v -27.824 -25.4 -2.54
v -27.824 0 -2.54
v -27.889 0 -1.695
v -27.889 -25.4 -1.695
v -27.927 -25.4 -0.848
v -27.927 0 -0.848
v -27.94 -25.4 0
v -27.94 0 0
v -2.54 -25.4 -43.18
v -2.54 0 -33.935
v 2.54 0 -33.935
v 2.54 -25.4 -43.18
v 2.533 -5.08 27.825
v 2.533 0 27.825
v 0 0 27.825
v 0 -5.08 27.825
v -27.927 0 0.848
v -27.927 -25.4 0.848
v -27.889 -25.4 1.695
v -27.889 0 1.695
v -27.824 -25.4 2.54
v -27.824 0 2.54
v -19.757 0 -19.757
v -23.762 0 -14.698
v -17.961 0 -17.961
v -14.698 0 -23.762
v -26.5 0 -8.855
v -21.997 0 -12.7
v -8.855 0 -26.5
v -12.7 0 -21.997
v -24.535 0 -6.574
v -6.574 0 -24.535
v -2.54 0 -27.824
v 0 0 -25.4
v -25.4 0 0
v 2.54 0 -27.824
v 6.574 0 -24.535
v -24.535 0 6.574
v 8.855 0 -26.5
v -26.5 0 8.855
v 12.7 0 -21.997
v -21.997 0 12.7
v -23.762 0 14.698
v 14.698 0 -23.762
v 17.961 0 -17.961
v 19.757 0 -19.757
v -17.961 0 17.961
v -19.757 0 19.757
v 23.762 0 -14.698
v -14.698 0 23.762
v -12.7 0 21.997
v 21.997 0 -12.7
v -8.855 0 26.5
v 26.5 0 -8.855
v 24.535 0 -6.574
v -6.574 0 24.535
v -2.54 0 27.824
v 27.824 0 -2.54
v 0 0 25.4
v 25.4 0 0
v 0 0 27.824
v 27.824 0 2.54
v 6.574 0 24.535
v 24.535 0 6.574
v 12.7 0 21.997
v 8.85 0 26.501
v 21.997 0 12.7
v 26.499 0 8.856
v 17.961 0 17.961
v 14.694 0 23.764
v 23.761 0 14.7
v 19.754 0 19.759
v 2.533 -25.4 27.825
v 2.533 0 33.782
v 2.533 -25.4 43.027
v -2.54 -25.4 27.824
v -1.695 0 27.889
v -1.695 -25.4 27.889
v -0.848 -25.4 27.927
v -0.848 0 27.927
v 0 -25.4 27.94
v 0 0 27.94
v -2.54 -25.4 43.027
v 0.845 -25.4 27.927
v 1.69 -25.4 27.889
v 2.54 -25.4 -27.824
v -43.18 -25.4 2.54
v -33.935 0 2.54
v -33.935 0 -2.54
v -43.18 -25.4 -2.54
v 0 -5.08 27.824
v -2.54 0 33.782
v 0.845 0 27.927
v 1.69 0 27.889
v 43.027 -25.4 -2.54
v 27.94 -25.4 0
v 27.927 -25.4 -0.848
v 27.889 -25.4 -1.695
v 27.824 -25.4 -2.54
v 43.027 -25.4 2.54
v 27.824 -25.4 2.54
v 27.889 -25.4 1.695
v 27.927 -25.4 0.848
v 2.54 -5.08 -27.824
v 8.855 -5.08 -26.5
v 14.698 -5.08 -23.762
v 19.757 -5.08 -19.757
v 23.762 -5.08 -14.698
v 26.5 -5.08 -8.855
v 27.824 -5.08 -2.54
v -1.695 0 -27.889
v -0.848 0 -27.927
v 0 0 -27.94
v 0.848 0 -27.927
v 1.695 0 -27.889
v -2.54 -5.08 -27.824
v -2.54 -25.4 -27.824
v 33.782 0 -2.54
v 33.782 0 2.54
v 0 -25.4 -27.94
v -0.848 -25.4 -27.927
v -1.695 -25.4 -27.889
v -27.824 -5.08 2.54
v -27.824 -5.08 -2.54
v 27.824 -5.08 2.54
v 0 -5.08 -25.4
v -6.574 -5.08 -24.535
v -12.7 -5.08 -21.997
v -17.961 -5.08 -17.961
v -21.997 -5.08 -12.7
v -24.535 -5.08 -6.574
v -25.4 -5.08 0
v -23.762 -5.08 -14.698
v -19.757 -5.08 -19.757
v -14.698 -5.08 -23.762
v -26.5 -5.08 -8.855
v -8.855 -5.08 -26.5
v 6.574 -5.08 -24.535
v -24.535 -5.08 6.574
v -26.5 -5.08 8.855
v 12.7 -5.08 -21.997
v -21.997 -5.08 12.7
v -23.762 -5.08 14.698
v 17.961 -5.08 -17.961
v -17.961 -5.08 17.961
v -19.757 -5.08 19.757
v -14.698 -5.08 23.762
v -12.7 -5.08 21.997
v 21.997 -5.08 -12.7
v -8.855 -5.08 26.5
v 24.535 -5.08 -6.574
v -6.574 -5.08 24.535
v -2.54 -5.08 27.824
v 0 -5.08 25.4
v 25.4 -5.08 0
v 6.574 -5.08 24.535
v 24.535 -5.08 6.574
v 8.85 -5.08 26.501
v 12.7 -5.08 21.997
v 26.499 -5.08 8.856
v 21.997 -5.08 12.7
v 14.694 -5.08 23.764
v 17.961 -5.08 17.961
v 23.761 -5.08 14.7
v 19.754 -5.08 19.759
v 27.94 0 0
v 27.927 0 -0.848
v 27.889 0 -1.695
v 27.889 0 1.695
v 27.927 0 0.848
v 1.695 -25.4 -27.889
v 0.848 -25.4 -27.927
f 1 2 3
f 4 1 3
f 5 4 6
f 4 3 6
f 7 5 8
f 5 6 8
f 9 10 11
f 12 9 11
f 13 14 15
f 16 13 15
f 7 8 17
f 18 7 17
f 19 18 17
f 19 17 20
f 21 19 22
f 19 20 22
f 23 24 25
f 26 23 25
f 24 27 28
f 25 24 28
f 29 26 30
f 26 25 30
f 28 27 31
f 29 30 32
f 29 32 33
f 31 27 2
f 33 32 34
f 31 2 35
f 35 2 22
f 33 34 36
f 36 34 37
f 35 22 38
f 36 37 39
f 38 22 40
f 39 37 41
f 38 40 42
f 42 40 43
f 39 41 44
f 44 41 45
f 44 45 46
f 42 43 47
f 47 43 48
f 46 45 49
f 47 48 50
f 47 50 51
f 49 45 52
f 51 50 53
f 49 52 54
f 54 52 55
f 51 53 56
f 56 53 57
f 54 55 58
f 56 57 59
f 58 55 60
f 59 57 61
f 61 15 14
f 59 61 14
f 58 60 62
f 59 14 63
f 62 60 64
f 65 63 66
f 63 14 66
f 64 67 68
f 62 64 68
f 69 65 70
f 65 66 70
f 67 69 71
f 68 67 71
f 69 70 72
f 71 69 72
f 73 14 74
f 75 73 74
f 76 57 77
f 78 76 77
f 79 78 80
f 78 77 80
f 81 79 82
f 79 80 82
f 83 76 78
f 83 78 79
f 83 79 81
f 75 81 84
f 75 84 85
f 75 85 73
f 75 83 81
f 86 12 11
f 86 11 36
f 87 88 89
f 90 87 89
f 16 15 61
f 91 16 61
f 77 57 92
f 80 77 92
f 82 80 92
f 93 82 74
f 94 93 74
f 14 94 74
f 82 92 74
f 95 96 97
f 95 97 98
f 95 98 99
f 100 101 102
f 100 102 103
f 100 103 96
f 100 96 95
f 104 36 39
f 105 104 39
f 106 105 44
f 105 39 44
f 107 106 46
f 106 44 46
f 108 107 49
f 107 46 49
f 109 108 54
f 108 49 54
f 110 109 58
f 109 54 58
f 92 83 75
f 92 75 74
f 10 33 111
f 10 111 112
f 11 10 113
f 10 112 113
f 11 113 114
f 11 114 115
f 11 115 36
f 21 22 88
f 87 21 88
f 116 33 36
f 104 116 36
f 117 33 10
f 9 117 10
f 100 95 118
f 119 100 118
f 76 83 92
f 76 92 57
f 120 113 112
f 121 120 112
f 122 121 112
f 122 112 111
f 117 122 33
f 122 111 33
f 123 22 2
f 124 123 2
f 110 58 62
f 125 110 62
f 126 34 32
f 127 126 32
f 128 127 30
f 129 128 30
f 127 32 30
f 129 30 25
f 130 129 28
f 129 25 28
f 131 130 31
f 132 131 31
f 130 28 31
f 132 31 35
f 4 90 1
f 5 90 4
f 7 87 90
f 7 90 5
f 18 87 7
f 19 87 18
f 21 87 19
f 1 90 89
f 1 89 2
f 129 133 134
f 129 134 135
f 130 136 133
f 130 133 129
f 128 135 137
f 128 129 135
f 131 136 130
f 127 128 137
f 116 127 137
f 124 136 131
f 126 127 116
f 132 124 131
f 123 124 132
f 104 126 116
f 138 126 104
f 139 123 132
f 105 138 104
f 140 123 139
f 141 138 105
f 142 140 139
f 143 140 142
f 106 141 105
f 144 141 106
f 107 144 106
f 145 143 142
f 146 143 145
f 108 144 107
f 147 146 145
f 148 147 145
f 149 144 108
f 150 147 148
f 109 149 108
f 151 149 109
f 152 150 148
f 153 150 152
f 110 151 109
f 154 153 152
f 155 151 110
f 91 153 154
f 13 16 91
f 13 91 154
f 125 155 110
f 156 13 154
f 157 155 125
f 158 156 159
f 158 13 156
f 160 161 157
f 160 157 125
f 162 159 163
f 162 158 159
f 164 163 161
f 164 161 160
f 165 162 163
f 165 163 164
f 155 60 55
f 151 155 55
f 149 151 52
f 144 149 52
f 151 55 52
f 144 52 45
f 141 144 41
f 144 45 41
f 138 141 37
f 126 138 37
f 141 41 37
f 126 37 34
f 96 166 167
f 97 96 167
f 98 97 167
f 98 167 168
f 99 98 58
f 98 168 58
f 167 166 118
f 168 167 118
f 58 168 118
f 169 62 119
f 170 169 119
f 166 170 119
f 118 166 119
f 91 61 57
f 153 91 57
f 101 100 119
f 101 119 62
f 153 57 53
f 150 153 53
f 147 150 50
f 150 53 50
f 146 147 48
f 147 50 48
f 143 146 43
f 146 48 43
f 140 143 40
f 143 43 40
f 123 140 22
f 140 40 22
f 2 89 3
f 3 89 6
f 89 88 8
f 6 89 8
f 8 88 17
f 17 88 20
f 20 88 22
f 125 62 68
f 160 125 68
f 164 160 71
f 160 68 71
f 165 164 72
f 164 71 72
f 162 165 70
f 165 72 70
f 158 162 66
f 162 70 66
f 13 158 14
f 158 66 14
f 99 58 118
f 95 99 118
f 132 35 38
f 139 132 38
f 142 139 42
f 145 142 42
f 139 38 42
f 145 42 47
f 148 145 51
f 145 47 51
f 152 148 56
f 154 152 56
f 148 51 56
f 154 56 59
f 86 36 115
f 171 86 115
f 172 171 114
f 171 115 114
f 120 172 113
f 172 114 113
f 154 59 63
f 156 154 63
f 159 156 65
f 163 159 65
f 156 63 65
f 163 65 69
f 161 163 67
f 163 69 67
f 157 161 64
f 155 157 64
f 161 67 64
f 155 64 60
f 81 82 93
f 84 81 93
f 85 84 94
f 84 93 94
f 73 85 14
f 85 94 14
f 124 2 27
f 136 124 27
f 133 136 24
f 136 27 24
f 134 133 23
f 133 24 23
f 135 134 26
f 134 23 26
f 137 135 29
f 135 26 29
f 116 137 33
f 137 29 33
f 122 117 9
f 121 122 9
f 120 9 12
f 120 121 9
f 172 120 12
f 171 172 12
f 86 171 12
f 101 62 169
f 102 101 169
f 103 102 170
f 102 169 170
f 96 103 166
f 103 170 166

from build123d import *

# Parameters (mm, degrees)
F1_DEPTH    = 5.08
F2_DEPTH    = 25.4
F3_SIZE2    = 9.244834
F3_SIZE     = 25.39999
F4_T1_DEPTH = 139.04164749
F5_T1_DEPTH = 139.048329282
F6_SIZE2    = 9.244834
F6_SIZE     = 25.39999


# Not quite as in the source:
# - a fillet or chamfer that OpenCascade refuses, or shapes differently, is made with other operations: its cross-section is extruded or revolved along the edge and cut away or added
# - a fillet or chamfer is up to 0.001 mm smaller than in the source, because OpenCascade refuses the exact size


with BuildPart() as f1:
    # F0 (on Front) → F1 (new body)
    with BuildSketch(Plane.XZ):
        with BuildLine():
            Line((0, -27.8243059213), (0, -25.4))
            ThreePointArc((0, -25.4), (-17.9605122421, -17.9605122421), (-25.4, 0))
            Line((-25.4, 0), (-27.8243059213, 0))
            Line((-27.8243059213, 0), (-27.8243059213, -2.54))
            ThreePointArc((-27.8243059213, -2.54), (-19.7565634664, -19.7565634664), (-2.54, -27.8243059213))
            Line((-2.54, -27.8243059213), (0, -27.8243059213))
        make_face()
        with BuildLine():
            Line((27.8243059213, 0), (25.4, 0))
            ThreePointArc((25.4, 0), (17.9605122421, -17.9605122421), (0, -25.4))
            Line((0, -25.4), (0, -27.8243059213))
            Line((0, -27.8243059213), (2.54, -27.8243059213))
            ThreePointArc((2.54, -27.8243059213), (19.7565634664, -19.7565634664), (27.8243059213, -2.54))
            Line((27.8243059213, -2.54), (27.8243059213, 0))
        make_face()
        with BuildLine():
            ThreePointArc((0, 25.4), (17.9605122421, 17.9605122421), (25.4, 0))
            Line((25.4, 0), (27.8243059213, 0))
            Line((27.8243059213, 0), (27.8243059213, 2.54))
            ThreePointArc((27.8243059213, 2.54), (19.7541911569, 19.758935491), (2.533318208, 27.8249150737))
            Line((2.533318208, 27.8249150737), (0, 27.8249150737))
            Line((0, 27.8249150737), (0, 27.8243059213))
            Line((0, 27.8243059213), (0, 25.4))
        make_face()
        with BuildLine():
            ThreePointArc((-25.4, 0), (-17.9605122421, 17.9605122421), (0, 25.4))
            Line((0, 25.4), (0, 27.8243059213))
            Line((0, 27.8243059213), (-2.54, 27.8243059213))
            ThreePointArc((-2.54, 27.8243059213), (-19.7565634664, 19.7565634664), (-27.8243059213, 2.54))
            Line((-27.8243059213, 2.54), (-27.8243059213, 0))
            Line((-27.8243059213, 0), (-25.4, 0))
        make_face()
    extrude(amount=F1_DEPTH)


with BuildPart() as f2:
    # F0 (on Front) → F2 (new body)
    with BuildSketch(Plane.XZ):
        with BuildLine():
            ThreePointArc((-27.8243059213, -2.54), (-27.911061494, -1.2713167504), (-27.94, 0))
            Line((-27.94, 0), (-43.18, 0))
            Line((-43.18, 0), (-43.18, -2.54))
            Line((-43.18, -2.54), (-27.8243059213, -2.54))
        make_face()
        with BuildLine():
            Line((-43.18, 0), (-27.94, 0))
            ThreePointArc((-27.94, 0), (-27.911061494, 1.2713167504), (-27.8243059213, 2.54))
            Line((-27.8243059213, 2.54), (-43.18, 2.54))
            Line((-43.18, 2.54), (-43.18, 0))
        make_face()
    extrude(amount=F2_DEPTH)

    # F3 (size 25.4 and 9.2448439504 in the source; OpenCascade refuses exactly that, so slightly less here)
    f3_edges = [f2.edges().sort_by_distance(p)[0] for p in [
        (-43.18, 0, 0),
    ]]
    chamfer(f3_edges, length=F3_SIZE, length2=F3_SIZE2)


with BuildPart() as f2b:
    # F0 (on Front) → F2, piece 2 (new body)
    with BuildSketch(Plane.XZ):
        with BuildLine():
            ThreePointArc((0, 27.94), (1.2679654651, 27.9112139395), (2.533318208, 27.8249150737))
            Line((2.533318208, 27.8249150737), (2.533318208, 43.18))
            Line((2.533318208, 43.18), (0, 43.18))
            Line((0, 43.18), (0, 27.94))
        make_face()
        with BuildLine():
            Line((-2.54, 43.18), (-2.54, 27.8243059213))
            ThreePointArc((-2.54, 27.8243059213), (-1.2713167504, 27.911061494), (0, 27.94))
            Line((0, 27.94), (0, 43.18))
            Line((0, 43.18), (-2.54, 43.18))
        make_face()
    extrude(amount=F2_DEPTH)

    # F4: chamfer of 9.398 x 25.820792788 on 1 edges, made by hand

    # F4_s2 → F4_t1 (cut)
    with BuildSketch(Plane.YZ.offset(-69.524164641)):
        Polygon((-25.820792788, 43.18), (0, 33.782), (0, 43.18), align=None)
    extrude(amount=F4_T1_DEPTH, mode=Mode.SUBTRACT)


with BuildPart() as f2c:
    # F0 (on Front) → F2, piece 3 (new body)
    with BuildSketch(Plane.XZ):
        with BuildLine():
            Line((43.18, 0), (27.94, 0))
            ThreePointArc((27.94, 0), (27.911061494, -1.2713167504), (27.8243059213, -2.54))
            Line((27.8243059213, -2.54), (43.18, -2.54))
            Line((43.18, -2.54), (43.18, 0))
        make_face()
        with BuildLine():
            ThreePointArc((27.8243059213, 2.54), (27.911061494, 1.2713167504), (27.94, 0))
            Line((27.94, 0), (43.18, 0))
            Line((43.18, 0), (43.18, 2.54))
            Line((43.18, 2.54), (27.8243059213, 2.54))
        make_face()
    extrude(amount=F2_DEPTH)

    # F5: chamfer of 9.398 x 25.820792788 on 1 edges, made by hand

    # F5_s2 → F5_t1 (cut)
    with BuildSketch(Plane.XY.offset(-69.524164641)):
        Polygon((43.18, -25.820792788), (33.782, 0), (43.18, 0), align=None)
    extrude(amount=F5_T1_DEPTH, mode=Mode.SUBTRACT)


with BuildPart() as f2d:
    # F0 (on Front) → F2, piece 4 (new body)
    with BuildSketch(Plane.XZ):
        with BuildLine():
            ThreePointArc((2.54, -27.8243059213), (1.2713167504, -27.911061494), (0, -27.94))
            Line((0, -27.94), (0, -43.18))
            Line((0, -43.18), (2.54, -43.18))
            Line((2.54, -43.18), (2.54, -27.8243059213))
        make_face()
        with BuildLine():
            Line((0, -43.18), (0, -27.94))
            ThreePointArc((0, -27.94), (-1.2713167504, -27.911061494), (-2.54, -27.8243059213))
            Line((-2.54, -27.8243059213), (-2.54, -43.18))
            Line((-2.54, -43.18), (0, -43.18))
        make_face()
    extrude(amount=F2_DEPTH)

    # F6 (size 25.4 and 9.2448439504 in the source; OpenCascade refuses exactly that, so slightly less here)
    f6_edges = [f2d.edges().sort_by_distance(p)[0] for p in [
        (0, 0, -43.18),
    ]]
    f6_side = f2d.faces().sort_by_distance((0, -12.7, -43.18))[0]
    chamfer(f6_edges, length=F6_SIZE, length2=F6_SIZE2, reference=f6_side)


solid = Compound([f1.part, f2.part, f2b.part, f2c.part, f2d.part])
